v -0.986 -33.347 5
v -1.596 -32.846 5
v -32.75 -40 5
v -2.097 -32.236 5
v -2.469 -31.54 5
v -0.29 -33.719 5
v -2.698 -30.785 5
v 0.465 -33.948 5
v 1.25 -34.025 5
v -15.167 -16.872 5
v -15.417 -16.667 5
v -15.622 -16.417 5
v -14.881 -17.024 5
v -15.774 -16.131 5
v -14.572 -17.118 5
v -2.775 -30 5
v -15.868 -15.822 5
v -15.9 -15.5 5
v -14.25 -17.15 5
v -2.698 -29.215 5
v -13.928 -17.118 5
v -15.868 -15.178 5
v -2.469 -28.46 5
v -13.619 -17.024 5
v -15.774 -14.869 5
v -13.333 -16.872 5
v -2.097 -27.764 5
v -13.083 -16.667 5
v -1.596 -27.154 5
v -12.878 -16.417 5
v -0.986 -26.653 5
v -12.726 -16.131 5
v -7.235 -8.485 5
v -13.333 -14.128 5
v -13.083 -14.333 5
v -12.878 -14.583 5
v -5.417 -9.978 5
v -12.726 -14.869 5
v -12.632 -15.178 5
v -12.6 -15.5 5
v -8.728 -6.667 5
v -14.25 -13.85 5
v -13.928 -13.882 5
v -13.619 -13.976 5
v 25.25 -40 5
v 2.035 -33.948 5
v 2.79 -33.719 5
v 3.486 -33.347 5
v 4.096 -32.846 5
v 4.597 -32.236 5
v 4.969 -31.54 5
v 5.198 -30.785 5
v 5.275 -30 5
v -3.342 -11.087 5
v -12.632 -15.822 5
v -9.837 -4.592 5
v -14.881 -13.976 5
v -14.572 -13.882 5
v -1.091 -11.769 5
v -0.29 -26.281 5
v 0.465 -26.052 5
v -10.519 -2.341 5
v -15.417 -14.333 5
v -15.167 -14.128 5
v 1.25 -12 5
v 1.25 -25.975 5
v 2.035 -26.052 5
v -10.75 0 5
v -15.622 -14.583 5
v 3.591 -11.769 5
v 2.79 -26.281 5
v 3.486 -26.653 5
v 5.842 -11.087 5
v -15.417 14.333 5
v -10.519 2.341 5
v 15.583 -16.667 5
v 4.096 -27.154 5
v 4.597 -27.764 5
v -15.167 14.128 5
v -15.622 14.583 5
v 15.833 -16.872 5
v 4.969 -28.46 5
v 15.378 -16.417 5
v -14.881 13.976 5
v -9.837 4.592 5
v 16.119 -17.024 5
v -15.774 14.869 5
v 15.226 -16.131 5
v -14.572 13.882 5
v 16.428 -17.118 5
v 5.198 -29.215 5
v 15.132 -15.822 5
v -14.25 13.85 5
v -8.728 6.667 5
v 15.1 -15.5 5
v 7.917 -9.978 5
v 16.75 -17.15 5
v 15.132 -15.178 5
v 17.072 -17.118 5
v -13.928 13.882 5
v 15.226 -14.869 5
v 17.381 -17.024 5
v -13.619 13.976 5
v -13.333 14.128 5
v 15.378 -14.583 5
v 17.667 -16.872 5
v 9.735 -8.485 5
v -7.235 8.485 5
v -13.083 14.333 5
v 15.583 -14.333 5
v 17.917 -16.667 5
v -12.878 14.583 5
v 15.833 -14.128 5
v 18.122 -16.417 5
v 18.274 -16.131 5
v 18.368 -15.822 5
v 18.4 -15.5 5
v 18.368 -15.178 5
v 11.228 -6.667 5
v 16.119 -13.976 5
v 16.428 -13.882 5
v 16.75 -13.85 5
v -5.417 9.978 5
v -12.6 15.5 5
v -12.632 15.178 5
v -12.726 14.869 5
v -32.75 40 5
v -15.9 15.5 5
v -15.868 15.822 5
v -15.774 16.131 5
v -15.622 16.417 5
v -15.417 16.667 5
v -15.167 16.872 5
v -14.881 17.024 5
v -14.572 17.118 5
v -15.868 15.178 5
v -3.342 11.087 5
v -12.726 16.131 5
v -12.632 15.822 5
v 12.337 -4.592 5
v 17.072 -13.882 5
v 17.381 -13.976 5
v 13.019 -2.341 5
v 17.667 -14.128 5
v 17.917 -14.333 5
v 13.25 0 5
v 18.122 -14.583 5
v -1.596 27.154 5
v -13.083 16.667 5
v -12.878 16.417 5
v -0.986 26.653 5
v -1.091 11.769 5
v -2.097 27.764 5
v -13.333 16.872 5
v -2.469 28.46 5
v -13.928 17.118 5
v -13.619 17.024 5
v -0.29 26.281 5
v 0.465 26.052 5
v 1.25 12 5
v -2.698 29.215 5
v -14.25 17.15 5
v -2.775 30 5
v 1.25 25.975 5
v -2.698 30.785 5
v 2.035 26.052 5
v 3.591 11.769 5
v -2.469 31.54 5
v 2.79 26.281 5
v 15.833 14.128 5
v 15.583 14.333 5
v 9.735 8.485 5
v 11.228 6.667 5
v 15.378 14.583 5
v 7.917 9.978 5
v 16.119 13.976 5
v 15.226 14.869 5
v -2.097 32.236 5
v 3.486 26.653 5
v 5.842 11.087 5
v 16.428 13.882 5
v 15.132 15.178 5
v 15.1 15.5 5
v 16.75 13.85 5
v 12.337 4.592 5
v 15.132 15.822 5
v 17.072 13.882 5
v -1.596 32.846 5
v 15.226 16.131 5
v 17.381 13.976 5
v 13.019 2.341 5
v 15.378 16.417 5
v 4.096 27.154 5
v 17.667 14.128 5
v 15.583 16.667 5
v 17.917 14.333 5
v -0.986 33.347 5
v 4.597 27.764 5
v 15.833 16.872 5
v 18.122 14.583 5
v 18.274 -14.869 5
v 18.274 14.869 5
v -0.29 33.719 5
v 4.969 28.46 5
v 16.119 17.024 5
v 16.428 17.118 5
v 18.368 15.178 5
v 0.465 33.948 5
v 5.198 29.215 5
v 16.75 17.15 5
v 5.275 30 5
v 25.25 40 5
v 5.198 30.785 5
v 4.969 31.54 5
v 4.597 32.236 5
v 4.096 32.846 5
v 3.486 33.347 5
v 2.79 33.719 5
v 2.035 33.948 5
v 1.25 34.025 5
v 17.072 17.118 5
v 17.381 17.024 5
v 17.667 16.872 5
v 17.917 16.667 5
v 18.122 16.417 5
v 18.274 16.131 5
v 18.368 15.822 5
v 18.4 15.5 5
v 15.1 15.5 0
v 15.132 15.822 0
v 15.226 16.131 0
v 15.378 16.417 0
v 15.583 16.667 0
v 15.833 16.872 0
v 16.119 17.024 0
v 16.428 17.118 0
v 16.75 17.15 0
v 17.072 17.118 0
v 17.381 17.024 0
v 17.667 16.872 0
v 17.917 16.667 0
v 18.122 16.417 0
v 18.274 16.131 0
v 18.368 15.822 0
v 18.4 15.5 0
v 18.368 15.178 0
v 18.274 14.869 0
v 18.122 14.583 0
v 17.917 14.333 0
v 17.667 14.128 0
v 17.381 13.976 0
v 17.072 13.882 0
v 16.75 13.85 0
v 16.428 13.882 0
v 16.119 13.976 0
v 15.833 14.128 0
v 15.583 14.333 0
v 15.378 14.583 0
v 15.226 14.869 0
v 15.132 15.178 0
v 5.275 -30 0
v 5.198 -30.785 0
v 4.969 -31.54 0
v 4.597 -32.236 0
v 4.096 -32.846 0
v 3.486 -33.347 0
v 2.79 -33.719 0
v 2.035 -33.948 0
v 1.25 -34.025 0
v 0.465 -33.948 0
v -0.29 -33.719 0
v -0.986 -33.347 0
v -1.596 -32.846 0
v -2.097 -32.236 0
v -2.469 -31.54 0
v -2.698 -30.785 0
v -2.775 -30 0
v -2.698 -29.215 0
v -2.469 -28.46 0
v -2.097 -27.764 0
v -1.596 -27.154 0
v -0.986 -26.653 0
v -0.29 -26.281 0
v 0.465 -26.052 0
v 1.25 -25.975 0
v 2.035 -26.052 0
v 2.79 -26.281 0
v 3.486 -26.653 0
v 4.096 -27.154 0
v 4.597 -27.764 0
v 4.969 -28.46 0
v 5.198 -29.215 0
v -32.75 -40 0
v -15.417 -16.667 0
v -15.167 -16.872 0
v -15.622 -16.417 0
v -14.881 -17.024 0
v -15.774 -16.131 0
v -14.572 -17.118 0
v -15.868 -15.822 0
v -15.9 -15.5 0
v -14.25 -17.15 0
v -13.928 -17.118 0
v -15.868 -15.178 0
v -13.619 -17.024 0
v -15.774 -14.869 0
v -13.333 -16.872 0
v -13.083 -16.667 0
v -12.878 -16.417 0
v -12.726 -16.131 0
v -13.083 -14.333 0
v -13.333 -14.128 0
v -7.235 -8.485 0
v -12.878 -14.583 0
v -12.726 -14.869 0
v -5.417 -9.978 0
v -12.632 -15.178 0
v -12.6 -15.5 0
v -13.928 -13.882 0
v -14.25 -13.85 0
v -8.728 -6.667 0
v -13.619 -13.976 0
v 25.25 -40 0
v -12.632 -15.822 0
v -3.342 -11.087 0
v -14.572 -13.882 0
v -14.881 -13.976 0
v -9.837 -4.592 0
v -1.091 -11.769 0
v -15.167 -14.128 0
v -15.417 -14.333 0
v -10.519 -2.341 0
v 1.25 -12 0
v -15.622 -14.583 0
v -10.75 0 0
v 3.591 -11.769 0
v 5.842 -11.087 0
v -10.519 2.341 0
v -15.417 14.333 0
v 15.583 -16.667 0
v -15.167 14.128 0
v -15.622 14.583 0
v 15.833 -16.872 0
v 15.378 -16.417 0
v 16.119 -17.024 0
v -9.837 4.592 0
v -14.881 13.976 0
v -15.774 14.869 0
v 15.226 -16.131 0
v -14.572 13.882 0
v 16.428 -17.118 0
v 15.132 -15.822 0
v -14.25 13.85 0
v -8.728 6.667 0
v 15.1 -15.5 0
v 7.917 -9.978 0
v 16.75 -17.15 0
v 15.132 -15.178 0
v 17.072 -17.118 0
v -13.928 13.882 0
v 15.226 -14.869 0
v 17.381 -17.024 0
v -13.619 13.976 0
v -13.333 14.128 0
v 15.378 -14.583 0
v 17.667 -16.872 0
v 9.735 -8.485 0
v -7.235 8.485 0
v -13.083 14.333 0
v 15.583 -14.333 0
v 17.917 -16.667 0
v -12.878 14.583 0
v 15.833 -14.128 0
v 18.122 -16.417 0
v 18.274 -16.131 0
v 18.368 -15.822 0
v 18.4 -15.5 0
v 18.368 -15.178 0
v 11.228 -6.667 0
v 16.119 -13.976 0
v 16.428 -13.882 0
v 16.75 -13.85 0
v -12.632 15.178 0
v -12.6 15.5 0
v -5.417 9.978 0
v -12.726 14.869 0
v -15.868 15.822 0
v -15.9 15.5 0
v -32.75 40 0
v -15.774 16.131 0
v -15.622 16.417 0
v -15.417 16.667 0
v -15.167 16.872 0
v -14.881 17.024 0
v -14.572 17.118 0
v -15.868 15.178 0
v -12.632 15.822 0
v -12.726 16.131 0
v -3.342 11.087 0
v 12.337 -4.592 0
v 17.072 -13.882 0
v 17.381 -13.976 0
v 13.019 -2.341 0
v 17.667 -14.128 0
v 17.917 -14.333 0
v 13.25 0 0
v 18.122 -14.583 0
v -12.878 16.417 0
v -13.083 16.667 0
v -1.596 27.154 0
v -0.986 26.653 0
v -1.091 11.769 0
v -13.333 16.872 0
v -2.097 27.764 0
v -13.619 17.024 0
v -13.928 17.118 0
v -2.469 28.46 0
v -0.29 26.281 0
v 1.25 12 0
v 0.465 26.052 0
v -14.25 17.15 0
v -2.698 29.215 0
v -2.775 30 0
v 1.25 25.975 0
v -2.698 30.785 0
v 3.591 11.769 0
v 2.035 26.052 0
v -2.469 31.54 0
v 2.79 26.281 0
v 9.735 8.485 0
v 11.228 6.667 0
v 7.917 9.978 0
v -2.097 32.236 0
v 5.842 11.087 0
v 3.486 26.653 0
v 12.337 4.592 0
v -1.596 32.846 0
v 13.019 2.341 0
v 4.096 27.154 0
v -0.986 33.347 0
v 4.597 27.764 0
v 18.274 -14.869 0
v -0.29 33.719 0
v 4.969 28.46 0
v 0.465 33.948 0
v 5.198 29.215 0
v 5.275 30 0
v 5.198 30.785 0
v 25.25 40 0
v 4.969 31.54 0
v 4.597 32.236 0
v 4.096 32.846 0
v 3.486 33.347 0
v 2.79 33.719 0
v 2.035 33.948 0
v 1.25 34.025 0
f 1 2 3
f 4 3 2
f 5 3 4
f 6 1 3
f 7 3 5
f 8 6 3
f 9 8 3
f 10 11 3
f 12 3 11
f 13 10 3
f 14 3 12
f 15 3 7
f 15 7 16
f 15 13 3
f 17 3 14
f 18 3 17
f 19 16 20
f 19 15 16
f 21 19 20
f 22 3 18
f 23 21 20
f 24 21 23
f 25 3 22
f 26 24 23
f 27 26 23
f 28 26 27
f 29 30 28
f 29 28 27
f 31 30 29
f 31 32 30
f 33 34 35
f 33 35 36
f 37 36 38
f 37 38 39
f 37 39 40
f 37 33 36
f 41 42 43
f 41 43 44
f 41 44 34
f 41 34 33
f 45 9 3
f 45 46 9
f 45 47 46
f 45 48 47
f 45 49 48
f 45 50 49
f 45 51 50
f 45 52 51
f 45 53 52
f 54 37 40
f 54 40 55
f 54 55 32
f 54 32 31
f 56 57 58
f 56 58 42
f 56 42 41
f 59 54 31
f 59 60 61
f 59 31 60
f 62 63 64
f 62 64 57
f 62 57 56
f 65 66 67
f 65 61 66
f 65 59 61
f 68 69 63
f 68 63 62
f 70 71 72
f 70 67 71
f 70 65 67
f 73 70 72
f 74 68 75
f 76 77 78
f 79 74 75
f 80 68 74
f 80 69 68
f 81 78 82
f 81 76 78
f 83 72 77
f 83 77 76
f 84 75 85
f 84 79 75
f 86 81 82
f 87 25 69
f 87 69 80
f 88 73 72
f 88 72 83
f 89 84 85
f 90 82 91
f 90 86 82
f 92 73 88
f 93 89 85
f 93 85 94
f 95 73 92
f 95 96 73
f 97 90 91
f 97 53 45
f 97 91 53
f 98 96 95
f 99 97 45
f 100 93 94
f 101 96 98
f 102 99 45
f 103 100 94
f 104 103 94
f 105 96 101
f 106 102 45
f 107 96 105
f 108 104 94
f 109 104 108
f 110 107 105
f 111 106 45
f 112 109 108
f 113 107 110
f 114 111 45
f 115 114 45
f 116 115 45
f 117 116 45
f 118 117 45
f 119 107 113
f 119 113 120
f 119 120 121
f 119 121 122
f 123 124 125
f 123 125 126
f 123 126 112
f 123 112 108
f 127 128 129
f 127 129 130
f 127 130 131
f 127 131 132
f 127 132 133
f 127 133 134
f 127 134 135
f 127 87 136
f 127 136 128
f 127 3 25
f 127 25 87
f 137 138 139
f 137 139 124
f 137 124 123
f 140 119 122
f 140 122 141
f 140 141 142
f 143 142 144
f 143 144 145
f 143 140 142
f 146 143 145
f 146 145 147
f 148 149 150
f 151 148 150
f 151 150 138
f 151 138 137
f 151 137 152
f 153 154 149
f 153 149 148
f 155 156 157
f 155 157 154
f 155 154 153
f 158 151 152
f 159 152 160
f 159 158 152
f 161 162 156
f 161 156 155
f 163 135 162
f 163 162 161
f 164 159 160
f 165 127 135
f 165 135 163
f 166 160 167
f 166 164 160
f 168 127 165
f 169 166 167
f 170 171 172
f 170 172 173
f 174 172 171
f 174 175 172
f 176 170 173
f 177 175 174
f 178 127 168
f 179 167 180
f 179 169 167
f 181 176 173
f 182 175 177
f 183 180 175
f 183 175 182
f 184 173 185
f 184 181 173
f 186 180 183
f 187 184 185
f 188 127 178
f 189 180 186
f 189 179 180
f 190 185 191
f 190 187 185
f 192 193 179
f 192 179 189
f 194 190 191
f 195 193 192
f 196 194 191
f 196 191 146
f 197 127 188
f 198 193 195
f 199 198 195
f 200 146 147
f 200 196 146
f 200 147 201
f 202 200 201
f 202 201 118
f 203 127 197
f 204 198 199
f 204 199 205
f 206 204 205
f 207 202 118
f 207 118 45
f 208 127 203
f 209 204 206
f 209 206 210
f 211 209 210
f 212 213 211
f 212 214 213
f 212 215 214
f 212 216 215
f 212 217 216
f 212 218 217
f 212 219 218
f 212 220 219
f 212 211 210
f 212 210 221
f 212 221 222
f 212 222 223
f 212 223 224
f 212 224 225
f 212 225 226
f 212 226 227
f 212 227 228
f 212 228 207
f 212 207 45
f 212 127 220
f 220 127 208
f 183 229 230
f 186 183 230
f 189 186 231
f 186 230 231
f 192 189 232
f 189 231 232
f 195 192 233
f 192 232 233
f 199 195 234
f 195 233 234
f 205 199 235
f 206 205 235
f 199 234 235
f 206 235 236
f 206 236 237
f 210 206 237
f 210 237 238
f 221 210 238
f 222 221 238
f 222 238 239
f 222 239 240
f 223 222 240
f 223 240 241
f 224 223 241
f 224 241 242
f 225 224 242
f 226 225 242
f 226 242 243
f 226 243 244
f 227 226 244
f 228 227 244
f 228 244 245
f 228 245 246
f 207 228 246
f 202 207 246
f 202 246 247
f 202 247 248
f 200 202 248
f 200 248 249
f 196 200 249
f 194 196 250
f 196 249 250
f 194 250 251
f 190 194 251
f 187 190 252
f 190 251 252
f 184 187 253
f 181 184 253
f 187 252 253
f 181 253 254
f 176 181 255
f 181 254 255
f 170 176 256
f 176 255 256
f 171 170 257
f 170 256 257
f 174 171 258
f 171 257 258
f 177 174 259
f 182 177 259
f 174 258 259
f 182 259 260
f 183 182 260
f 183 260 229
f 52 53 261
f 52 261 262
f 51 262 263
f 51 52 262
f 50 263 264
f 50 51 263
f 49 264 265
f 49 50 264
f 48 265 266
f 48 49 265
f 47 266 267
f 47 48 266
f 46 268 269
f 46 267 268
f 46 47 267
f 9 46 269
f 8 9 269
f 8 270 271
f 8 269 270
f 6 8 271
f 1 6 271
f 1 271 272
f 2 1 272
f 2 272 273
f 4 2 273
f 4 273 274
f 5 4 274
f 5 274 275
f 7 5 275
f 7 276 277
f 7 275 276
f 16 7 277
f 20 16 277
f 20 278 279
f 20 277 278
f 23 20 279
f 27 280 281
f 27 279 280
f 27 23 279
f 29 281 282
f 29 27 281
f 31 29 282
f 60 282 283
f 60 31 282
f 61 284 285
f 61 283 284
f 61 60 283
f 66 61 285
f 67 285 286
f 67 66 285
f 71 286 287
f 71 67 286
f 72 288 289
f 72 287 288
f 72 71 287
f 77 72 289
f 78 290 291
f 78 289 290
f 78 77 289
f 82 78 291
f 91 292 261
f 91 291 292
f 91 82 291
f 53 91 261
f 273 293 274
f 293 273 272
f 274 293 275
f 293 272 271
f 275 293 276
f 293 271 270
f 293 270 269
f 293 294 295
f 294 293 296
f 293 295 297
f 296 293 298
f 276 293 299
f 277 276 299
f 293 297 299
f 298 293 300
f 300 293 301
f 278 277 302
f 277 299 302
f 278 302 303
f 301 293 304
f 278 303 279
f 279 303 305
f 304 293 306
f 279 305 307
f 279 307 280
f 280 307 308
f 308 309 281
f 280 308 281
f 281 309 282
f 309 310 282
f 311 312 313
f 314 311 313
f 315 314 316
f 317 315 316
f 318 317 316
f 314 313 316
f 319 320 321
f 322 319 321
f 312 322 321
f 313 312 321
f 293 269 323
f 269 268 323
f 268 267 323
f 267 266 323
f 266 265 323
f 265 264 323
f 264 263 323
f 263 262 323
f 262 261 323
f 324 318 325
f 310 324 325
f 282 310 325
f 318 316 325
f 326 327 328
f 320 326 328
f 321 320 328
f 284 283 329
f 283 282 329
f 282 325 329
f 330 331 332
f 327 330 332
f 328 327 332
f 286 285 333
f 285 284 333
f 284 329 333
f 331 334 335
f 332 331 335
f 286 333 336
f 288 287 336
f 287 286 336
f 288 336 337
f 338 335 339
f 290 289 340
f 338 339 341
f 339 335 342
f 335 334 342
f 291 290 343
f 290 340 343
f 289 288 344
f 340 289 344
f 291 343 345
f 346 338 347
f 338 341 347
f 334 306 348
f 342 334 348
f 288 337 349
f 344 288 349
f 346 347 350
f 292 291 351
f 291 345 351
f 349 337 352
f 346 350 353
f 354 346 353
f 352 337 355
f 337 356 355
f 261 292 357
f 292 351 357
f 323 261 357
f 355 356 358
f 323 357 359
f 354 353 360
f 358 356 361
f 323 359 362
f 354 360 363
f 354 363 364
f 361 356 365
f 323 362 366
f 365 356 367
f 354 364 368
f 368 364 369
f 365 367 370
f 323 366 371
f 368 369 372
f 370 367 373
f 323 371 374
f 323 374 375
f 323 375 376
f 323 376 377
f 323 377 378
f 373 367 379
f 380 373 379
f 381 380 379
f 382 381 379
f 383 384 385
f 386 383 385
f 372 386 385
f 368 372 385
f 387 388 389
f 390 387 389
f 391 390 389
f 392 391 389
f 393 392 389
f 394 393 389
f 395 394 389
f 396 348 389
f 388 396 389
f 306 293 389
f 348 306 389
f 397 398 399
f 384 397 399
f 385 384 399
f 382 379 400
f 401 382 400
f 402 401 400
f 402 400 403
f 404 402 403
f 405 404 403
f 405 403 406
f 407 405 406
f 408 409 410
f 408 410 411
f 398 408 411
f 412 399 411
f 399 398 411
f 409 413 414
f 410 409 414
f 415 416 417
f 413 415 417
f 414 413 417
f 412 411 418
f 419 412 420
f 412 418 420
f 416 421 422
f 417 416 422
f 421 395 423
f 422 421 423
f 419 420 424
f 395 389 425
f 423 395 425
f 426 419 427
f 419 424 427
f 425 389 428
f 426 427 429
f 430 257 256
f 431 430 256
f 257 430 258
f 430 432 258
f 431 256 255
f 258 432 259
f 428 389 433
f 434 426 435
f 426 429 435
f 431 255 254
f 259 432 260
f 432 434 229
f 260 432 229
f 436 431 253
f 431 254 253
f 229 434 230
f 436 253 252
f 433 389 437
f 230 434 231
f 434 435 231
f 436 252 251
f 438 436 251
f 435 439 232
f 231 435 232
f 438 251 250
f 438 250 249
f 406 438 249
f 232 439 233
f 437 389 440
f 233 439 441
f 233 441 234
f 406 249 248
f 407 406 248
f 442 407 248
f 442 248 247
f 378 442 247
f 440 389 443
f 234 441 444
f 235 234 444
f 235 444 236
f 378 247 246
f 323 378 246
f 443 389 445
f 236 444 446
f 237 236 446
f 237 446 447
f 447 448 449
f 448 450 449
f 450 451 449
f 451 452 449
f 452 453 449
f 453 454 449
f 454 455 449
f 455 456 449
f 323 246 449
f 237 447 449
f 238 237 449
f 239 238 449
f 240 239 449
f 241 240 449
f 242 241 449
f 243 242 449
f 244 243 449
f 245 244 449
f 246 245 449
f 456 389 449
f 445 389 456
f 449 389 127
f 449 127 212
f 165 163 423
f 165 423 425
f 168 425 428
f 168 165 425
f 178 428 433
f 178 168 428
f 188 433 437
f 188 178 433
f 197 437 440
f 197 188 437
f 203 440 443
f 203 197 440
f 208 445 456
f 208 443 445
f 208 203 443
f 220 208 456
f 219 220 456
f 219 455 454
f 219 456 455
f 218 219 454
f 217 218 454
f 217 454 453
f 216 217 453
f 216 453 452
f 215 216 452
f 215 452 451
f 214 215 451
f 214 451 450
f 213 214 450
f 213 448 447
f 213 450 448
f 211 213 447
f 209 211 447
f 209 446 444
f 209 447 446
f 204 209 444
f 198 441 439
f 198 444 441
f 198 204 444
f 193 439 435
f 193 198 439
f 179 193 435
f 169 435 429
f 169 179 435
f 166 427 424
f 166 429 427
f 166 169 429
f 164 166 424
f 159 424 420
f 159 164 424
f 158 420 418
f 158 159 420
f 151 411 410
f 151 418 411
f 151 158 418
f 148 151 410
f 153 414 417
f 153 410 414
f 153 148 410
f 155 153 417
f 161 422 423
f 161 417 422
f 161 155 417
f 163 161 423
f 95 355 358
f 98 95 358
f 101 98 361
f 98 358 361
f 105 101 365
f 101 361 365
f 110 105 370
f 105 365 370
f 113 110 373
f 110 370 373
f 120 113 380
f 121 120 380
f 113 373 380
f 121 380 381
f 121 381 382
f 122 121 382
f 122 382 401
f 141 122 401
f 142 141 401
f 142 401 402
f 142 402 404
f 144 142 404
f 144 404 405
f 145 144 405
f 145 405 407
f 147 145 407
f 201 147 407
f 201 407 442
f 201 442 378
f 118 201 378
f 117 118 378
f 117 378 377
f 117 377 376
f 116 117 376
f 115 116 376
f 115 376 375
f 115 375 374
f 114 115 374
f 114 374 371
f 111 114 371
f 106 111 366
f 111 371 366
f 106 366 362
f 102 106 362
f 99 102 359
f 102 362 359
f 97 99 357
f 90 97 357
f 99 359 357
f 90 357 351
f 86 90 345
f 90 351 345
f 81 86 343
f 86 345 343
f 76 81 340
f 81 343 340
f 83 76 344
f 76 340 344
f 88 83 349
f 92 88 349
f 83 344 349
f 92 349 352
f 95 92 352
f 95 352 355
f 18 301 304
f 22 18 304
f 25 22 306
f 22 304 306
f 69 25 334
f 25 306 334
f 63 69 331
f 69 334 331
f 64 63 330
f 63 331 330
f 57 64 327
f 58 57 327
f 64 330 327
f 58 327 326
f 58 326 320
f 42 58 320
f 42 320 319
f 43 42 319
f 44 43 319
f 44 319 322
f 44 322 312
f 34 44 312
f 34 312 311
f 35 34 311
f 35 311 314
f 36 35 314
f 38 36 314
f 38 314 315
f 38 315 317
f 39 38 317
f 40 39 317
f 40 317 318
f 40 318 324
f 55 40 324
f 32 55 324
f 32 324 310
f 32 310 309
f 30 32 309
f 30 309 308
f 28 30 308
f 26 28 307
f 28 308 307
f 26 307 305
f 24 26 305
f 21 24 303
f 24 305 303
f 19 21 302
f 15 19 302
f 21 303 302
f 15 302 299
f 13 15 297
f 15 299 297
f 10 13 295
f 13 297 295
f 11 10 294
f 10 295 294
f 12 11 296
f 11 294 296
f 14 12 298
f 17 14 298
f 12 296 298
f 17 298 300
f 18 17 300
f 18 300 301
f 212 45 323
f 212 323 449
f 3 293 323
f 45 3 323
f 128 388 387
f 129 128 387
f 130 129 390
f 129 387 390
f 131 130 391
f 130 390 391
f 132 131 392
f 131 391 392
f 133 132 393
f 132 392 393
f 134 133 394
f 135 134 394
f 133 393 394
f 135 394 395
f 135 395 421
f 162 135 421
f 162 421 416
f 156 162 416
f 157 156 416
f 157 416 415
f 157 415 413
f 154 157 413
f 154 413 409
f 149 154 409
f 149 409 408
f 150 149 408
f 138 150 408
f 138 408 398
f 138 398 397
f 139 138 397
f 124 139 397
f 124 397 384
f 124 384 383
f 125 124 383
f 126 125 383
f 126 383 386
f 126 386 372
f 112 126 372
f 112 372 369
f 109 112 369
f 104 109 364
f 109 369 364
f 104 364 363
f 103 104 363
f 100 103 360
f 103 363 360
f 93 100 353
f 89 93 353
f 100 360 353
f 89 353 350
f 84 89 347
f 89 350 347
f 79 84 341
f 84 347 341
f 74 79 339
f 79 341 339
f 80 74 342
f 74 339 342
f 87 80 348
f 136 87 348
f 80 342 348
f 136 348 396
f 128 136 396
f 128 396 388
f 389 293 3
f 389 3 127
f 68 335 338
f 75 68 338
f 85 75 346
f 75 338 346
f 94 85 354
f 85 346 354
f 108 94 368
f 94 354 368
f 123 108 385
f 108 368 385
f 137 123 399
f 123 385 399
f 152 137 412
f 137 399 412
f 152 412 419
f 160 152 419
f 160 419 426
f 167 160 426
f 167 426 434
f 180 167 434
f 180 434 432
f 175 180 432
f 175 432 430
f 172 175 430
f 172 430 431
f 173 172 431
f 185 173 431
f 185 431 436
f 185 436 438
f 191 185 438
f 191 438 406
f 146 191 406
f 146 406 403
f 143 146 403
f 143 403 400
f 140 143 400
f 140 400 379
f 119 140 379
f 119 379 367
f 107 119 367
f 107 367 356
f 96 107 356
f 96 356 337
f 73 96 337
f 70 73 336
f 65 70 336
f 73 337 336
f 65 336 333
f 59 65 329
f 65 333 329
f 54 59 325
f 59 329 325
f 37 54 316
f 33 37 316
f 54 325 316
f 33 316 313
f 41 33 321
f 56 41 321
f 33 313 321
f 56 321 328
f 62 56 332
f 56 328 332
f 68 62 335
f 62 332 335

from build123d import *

# Parameters (mm, degrees)
SKETCH1_W               = 65.5
SKETCH1_H               = 80
BOSS_EXTRUDE1_DEPTH     = 5
SKETCH2_W               = 7.499999691
SKETCH2_H               = 80
CUT_EXTRUDE1_DEPTH      = 52.938064076
SKETCH3_R               = 12
SKETCH3_R_2             = 1.65
CUT_EXTRUDE2_DEPTH      = 52.938064076
CUT_EXTRUDE3_DEPTH      = 52.938064076
CUT_EXTRUDE3_DEPTH_BACK = 52.938064076
SKETCH4_R               = 4.025


with BuildPart() as part:
    # Sketch1 → Boss-Extrude1 (new body)
    with BuildSketch(Plane.XY):
        Rectangle(SKETCH1_W, SKETCH1_H)
    extrude(amount=BOSS_EXTRUDE1_DEPTH)

    # Sketch2 → Cut-Extrude1 (cut, through all)
    with BuildSketch(Plane.XY.offset(5)):
        with Locations((29.000000155, 0)):
            Rectangle(SKETCH2_W, SKETCH2_H)
    extrude(amount=-CUT_EXTRUDE1_DEPTH, mode=Mode.SUBTRACT)

    # Sketch3 → Cut-Extrude2 (cut, through all)
    with BuildSketch(Plane(origin=(0, 0, 0), x_dir=(-1, 0, 0), z_dir=(0, 0, -1))):
        with Locations((-1.25, 0)):
            Circle(SKETCH3_R)
        with Locations((-16.75, 15.5)):
            Circle(SKETCH3_R_2)
        with Locations((14.25, 15.5)):
            Circle(SKETCH3_R_2)
        with Locations((14.25, -15.5)):
            Circle(SKETCH3_R_2)
        with Locations((-16.75, -15.5)):
            Circle(SKETCH3_R_2)
    extrude(amount=-CUT_EXTRUDE2_DEPTH, mode=Mode.SUBTRACT)

    # Sketch4 → Cut-Extrude3 (cut, two sides: drawn at the far end of the back side and taken through both)
    with BuildSketch(Plane(origin=(0, 0, 0), x_dir=(-1, 0, 0), z_dir=(0, 0, -1)).offset(-CUT_EXTRUDE3_DEPTH_BACK)):
        with Locations((-1.25, 30)):
            Circle(SKETCH4_R)
        with Locations(Location((-1.25, -30, 0), (0, 0, 180))):
            Circle(SKETCH4_R)
    extrude(amount=CUT_EXTRUDE3_DEPTH + CUT_EXTRUDE3_DEPTH_BACK, mode=Mode.SUBTRACT)


solid = part.part
